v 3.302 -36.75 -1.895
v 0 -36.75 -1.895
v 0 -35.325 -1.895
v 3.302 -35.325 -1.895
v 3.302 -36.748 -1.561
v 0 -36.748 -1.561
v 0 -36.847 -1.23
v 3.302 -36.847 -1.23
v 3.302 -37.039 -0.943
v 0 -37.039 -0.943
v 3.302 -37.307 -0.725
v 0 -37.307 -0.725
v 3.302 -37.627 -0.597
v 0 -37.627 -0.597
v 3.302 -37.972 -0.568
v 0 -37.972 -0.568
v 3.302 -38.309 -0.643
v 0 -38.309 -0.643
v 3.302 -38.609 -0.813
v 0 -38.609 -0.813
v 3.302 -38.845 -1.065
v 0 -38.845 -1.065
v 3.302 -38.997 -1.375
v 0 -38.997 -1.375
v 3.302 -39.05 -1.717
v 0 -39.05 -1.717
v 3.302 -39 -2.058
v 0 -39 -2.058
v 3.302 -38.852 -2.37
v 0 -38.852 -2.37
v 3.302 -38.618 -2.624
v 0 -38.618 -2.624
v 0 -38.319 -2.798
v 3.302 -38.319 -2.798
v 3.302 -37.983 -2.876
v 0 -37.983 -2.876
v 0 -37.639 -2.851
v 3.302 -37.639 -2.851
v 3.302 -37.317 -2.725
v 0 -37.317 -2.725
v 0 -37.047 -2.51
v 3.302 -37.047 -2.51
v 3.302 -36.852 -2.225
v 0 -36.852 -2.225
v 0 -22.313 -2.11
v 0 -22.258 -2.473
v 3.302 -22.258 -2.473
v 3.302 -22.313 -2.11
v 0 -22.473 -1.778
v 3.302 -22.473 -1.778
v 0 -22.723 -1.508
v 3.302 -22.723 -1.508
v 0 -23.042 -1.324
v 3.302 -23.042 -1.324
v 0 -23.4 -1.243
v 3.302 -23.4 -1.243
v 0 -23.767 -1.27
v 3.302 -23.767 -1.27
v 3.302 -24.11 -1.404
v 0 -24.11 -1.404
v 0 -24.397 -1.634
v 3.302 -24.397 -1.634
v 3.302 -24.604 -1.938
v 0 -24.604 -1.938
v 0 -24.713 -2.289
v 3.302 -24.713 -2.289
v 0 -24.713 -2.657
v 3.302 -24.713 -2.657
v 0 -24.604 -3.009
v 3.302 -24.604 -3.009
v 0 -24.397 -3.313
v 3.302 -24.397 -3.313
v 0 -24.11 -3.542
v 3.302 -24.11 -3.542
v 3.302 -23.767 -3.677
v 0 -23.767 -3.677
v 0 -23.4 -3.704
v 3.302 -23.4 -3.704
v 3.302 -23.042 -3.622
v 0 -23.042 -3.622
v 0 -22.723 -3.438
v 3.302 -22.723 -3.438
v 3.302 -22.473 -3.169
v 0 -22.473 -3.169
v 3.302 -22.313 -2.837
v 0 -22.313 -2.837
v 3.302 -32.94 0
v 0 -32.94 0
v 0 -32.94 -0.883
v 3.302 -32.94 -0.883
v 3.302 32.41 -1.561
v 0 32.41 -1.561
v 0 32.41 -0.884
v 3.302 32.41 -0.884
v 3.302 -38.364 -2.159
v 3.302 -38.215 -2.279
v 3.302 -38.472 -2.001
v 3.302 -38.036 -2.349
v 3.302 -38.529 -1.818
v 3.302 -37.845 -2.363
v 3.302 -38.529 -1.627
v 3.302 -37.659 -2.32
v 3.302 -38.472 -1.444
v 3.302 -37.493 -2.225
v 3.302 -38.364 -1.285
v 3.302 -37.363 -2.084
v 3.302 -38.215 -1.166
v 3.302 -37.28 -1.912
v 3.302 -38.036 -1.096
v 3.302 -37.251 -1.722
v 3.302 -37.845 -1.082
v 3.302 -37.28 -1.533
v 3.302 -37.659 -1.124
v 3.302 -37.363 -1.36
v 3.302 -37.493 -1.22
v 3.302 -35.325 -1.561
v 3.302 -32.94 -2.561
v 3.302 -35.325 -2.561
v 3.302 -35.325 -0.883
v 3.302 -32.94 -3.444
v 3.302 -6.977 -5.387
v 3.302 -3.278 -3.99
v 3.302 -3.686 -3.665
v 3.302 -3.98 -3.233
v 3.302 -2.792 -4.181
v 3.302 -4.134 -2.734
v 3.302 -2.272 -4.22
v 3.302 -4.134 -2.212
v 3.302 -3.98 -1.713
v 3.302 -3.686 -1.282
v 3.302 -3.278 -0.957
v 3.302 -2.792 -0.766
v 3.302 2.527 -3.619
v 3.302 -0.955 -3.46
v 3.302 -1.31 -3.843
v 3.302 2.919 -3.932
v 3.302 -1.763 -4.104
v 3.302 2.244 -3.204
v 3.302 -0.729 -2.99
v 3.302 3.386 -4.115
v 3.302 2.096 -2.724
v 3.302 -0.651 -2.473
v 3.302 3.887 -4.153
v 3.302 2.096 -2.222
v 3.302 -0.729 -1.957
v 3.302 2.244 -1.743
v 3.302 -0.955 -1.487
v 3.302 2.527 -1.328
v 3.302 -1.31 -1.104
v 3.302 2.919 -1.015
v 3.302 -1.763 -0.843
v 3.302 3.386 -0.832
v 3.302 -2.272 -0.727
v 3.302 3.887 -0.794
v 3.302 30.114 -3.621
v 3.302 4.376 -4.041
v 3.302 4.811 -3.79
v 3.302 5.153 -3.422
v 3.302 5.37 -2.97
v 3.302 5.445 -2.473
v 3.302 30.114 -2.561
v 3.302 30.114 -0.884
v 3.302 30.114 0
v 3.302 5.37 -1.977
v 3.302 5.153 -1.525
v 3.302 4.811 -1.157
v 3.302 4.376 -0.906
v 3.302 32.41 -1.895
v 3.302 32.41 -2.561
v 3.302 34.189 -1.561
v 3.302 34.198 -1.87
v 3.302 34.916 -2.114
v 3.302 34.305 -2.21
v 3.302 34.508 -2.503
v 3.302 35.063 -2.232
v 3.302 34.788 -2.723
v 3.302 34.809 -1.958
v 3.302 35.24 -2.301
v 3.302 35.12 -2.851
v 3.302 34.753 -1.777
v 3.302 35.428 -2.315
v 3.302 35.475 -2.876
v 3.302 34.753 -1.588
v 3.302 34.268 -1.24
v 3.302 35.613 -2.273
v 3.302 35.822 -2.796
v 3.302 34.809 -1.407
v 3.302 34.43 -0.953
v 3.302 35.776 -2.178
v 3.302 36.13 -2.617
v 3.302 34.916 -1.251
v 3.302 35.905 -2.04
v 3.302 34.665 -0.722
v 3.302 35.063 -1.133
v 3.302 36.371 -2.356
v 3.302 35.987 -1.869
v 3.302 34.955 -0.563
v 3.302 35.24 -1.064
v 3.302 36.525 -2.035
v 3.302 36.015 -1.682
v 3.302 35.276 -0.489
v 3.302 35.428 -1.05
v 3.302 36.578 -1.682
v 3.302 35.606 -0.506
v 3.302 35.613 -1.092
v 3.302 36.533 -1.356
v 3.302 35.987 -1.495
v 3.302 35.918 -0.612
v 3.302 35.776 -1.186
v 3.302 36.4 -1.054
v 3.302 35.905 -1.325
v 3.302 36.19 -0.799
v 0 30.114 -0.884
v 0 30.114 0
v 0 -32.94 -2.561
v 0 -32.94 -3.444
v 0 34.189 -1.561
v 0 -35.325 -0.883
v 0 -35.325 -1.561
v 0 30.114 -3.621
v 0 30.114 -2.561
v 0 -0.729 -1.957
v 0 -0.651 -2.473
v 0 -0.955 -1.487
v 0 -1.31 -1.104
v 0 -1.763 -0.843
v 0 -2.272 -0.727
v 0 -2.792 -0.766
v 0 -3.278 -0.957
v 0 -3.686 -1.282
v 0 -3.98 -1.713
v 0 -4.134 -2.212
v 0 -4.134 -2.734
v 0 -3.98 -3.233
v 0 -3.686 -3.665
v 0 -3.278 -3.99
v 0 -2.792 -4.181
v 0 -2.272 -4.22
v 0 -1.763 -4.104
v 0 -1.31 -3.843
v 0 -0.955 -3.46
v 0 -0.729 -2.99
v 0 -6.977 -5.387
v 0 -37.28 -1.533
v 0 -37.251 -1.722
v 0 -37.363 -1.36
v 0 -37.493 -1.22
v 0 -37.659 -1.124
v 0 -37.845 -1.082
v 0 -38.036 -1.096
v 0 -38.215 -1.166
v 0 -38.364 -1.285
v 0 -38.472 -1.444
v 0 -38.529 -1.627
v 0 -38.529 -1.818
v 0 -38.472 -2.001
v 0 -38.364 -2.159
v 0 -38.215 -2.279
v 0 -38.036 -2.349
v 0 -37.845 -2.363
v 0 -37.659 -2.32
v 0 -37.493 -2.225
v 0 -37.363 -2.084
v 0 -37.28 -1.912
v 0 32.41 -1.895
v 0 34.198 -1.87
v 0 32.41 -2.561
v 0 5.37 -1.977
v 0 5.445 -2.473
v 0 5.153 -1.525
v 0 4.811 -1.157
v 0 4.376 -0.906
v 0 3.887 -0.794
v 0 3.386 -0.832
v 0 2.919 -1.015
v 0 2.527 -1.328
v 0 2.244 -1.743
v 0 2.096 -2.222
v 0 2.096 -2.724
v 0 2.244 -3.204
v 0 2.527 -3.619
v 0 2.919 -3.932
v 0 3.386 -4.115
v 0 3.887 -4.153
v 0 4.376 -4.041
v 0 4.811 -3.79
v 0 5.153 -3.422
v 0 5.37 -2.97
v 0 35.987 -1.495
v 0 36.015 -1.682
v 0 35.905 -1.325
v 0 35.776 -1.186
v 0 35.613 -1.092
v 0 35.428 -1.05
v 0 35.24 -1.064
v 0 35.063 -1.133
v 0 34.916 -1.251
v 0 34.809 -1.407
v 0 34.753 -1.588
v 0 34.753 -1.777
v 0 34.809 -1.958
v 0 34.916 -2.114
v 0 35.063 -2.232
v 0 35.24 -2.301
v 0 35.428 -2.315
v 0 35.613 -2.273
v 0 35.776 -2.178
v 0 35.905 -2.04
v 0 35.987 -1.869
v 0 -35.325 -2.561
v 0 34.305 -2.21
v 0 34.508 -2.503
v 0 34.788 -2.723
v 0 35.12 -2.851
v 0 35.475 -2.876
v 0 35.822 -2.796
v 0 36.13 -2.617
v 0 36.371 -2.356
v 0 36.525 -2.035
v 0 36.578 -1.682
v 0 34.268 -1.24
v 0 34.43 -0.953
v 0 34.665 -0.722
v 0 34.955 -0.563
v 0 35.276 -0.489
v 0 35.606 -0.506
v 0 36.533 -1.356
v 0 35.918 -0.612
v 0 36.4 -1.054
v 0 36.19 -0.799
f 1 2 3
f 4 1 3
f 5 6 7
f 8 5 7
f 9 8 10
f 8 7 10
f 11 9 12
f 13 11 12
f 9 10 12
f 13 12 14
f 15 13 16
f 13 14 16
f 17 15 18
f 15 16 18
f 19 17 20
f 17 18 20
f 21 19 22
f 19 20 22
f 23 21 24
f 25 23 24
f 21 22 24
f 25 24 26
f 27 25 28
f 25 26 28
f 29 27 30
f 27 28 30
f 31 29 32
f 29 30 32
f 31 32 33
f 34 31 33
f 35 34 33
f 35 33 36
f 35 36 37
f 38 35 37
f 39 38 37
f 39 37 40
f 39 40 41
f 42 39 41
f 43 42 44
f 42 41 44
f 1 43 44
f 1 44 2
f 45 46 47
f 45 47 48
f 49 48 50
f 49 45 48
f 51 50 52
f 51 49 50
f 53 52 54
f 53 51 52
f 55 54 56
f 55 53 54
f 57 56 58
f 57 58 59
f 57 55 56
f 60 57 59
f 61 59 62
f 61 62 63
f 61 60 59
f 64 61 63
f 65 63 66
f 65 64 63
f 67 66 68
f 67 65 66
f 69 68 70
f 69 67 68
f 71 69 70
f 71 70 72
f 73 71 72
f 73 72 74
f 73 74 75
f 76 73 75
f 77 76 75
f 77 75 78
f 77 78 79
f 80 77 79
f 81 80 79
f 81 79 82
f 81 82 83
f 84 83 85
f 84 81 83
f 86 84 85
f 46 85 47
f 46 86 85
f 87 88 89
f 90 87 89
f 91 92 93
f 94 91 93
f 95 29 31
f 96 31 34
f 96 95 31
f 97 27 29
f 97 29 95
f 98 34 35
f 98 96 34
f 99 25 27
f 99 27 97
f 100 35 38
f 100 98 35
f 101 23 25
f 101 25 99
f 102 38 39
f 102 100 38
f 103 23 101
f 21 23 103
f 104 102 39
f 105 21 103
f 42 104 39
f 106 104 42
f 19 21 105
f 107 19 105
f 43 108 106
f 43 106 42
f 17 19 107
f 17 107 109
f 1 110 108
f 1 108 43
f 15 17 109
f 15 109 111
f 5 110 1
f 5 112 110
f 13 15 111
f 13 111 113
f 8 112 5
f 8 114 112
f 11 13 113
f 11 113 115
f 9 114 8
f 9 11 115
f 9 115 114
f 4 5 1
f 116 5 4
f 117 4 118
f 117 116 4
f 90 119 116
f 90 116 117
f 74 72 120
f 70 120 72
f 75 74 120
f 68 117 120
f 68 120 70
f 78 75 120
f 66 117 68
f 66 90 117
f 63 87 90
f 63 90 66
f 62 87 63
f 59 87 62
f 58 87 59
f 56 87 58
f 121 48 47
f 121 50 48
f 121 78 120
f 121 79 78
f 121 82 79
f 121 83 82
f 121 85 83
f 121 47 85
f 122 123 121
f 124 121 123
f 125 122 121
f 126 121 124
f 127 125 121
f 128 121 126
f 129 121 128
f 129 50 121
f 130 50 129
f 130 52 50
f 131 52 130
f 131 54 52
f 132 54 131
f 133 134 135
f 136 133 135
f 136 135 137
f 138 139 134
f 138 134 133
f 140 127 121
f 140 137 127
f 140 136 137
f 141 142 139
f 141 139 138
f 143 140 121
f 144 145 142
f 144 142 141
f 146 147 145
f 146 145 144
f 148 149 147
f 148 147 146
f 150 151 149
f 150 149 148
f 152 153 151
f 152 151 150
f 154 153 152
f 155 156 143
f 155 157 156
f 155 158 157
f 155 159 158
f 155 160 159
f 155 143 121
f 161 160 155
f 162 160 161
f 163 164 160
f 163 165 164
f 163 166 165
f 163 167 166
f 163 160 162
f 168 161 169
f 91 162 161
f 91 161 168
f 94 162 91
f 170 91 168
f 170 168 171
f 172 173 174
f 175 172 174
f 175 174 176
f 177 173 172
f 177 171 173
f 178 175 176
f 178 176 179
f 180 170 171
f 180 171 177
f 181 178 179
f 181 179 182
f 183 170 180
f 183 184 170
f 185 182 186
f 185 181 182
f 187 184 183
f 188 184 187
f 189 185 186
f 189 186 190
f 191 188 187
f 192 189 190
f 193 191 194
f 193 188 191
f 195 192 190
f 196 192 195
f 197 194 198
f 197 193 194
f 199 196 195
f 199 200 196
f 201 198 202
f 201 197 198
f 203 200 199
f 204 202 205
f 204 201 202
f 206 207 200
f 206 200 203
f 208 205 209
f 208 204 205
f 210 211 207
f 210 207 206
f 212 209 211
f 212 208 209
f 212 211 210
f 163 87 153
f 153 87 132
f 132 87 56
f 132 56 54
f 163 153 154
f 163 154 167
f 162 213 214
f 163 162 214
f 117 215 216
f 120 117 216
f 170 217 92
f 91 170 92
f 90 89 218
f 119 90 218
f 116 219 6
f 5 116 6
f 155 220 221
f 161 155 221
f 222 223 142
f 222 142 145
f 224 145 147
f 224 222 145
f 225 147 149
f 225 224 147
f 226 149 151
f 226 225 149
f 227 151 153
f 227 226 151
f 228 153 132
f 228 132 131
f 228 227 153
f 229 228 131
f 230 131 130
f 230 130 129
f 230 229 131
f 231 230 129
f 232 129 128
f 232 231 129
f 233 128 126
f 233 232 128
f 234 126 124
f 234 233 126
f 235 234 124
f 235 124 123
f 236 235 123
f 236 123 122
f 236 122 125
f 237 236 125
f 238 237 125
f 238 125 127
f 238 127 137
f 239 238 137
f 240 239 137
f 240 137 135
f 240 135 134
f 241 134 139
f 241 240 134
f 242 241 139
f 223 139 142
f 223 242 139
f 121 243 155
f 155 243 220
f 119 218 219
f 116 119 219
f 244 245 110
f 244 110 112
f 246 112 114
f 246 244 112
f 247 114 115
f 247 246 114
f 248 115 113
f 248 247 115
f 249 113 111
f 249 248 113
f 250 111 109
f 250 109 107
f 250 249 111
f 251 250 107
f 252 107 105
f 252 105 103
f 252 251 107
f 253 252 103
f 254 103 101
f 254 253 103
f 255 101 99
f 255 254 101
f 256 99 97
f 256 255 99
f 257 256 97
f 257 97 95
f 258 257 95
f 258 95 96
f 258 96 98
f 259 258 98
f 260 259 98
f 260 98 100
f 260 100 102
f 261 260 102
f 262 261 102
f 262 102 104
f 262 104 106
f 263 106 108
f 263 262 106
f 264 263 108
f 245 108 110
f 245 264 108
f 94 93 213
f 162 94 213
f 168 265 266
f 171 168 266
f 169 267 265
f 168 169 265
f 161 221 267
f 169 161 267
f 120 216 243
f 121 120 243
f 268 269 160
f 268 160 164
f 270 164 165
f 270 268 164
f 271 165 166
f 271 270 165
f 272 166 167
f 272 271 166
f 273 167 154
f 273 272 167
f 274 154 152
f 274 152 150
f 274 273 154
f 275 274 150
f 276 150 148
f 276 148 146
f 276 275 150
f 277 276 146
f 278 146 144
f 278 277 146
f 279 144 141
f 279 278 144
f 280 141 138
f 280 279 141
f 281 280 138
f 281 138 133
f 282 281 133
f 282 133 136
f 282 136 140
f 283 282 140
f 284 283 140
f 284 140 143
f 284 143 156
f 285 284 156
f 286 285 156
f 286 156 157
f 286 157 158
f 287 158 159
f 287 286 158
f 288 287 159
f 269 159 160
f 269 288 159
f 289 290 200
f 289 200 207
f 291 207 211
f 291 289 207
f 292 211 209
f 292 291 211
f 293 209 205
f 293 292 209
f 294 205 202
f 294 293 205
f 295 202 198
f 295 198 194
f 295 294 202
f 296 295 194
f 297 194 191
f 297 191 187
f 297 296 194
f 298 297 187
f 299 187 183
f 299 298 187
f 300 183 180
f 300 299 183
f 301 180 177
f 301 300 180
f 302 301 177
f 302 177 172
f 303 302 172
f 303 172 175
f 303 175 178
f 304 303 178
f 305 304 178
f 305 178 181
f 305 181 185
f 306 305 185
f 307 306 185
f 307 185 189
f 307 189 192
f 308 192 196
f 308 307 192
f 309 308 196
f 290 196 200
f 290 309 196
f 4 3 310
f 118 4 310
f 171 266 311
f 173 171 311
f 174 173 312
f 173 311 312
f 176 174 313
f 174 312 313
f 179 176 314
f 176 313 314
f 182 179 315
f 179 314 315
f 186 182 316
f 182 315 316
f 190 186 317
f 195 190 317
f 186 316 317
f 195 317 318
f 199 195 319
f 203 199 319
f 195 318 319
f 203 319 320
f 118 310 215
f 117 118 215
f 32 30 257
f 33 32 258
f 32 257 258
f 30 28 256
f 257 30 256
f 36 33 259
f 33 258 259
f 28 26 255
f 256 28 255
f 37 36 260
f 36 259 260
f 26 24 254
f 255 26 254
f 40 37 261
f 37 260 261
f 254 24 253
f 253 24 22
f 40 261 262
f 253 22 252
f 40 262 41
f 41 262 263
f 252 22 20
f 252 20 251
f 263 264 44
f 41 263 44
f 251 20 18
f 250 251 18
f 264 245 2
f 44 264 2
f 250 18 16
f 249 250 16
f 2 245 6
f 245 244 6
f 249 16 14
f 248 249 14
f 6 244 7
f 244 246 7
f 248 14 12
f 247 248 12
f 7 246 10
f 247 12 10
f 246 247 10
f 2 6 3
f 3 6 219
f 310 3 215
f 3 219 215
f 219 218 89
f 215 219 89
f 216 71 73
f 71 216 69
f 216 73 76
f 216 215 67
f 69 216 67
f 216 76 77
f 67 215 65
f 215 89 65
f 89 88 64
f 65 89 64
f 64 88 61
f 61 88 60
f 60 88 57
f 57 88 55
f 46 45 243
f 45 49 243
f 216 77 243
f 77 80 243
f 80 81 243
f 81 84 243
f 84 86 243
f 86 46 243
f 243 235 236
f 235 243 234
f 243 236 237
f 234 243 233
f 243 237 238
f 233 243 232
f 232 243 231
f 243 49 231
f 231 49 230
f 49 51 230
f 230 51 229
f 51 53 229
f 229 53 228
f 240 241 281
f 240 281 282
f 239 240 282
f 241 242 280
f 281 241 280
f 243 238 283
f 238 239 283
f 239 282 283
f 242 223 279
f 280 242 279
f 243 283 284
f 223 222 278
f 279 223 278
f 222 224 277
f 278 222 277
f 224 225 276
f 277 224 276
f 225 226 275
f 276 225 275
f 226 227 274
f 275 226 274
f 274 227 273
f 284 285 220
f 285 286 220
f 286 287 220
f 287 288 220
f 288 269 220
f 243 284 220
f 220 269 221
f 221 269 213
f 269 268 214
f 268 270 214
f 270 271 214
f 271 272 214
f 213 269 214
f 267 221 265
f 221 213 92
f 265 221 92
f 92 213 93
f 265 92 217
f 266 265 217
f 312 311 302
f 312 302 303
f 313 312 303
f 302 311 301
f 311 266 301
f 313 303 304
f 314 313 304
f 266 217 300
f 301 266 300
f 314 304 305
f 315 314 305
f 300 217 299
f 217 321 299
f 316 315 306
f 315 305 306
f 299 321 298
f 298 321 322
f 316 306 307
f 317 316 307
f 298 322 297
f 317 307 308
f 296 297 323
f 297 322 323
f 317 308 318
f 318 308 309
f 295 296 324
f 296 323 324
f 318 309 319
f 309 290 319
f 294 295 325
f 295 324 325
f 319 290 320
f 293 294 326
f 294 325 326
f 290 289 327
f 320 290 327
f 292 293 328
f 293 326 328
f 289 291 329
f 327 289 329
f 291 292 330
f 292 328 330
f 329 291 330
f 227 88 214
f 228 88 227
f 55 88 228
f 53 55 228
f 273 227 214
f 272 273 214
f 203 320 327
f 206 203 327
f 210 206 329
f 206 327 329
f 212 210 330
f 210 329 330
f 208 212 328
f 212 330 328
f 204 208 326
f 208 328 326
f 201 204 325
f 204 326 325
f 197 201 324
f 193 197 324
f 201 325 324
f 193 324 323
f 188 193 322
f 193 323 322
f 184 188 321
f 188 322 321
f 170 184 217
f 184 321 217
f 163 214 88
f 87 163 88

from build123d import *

# Parameters (mm, degrees)
F0_R     = 1.2342692754
F0_R_2   = 1.7514332525
F0_R_3   = 1.6840139575
F0_R_4   = 0.6424379712
F0_R_5   = 0.6344814838
F1_DEPTH = 3.302


with BuildPart() as f1:
    # F0 (on Right) → F1 (new body)
    with BuildSketch(Plane.YZ):
        Polygon((30.1141384989, 0), (0, 0), (-32.9401008785, 0), (-32.9401008785, -0.8831103914), (-32.9401008785, -2.5610264856), (-32.9401008785, -3.4441391472), (-6.9765895605, -5.3869867697), (30.1141384989, -3.6207614467), (30.1141384989, -2.5610264856), (30.1141384989, -0.883640887), align=None)
        with Locations((-23.4924610704, -2.4733557366)):
            Circle(F0_R, mode=Mode.SUBTRACT)
        with Locations((-2.4024450686, -2.4733557366)):
            Circle(F0_R_2, mode=Mode.SUBTRACT)
        with Locations((3.7611864973, -2.4733557366)):
            Circle(F0_R_3, mode=Mode.SUBTRACT)
        Polygon((-32.9401008785, -2.5610264856), (-32.9401008785, -0.8831103914), (-35.3245027363, -0.8831103914), (-35.3245027363, -1.5608620106), (-35.3245027363, -1.7220684385), (-35.3245027363, -1.8952260725), (-35.3245027363, -2.5610264856), align=None)
        Polygon((32.4102304876, -0.883640887), (30.1141384989, -0.883640887), (30.1141384989, -2.5610264856), (32.4102304876, -2.5610264856), (32.4102304876, -1.8952260725), (32.4102304876, -1.7223336863), (32.4102304876, -1.5608620106), align=None)
        with BuildLine():
            Line((-35.3245027363, -1.7220684385), (-35.3245027363, -1.5608620106))
            Line((-35.3245027363, -1.5608620106), (-36.7480435846, -1.5608620106))
            ThreePointArc((-36.7480435846, -1.5608620106), (-36.7395622808, -1.6412672061), (-36.736718196, -1.7220684385))
            Line((-36.736718196, -1.7220684385), (-35.3245027363, -1.7220684385))
        make_face()
        with BuildLine():
            Line((34.18918825, -1.5608620106), (32.4102304876, -1.5608620106))
            Line((32.4102304876, -1.5608620106), (32.4102304876, -1.7223336863))
            Line((32.4102304876, -1.7223336863), (32.4102304876, -1.8952260725))
            Line((32.4102304876, -1.8952260725), (34.1978147229, -1.8702070236))
            ThreePointArc((34.1978147229, -1.8702070236), (34.1834682887, -1.7158143054), (34.18918825, -1.5608620106))
        make_face()
        with BuildLine():
            Line((-36.7497117243, -1.8952260725), (-35.3245027363, -1.8952260725))
            Line((-35.3245027363, -1.8952260725), (-35.3245027363, -1.7220684385))
            Line((-35.3245027363, -1.7220684385), (-36.736718196, -1.7220684385))
            ThreePointArc((-36.736718196, -1.7220684385), (-36.7367181732, -1.7222010624), (-36.7367181656, -1.7223336863))
            ThreePointArc((-36.7367181656, -1.7223336863), (-36.7399711292, -1.8090236652), (-36.7497117243, -1.8952260725))
        make_face()
        with BuildLine():
            ThreePointArc((-36.736718196, -1.7220684385), (-36.7395622808, -1.6412672061), (-36.7480435846, -1.5608620106))
            ThreePointArc((-36.7480435846, -1.5608620106), (-39.050204678, -1.7165627393), (-36.7497117243, -1.8952260725))
            ThreePointArc((-36.7497117243, -1.8952260725), (-36.7399711292, -1.8090236652), (-36.7367181656, -1.7223336863))
            ThreePointArc((-36.7367181656, -1.7223336863), (-36.7367181732, -1.7222010624), (-36.736718196, -1.7220684385))
        make_face()
        with Locations((-37.8934686196, -1.7223336863)):
            Circle(F0_R_4, mode=Mode.SUBTRACT)
        with BuildLine():
            Line((34.1978147229, -1.5608620106), (34.18918825, -1.5608620106))
            ThreePointArc((34.18918825, -1.5608620106), (34.1834682887, -1.7158143054), (34.1978147229, -1.8702070236))
            Line((34.1978147229, -1.8702070236), (34.1978147229, -1.5608620106))
        make_face()
        with BuildLine():
            ThreePointArc((36.5784095148, -1.6824278282), (35.4415677285, -0.4862718496), (34.18918825, -1.5608620106))
            Line((34.18918825, -1.5608620106), (34.1978147229, -1.5608620106))
            Line((34.1978147229, -1.5608620106), (34.1978147229, -1.8702070236))
            ThreePointArc((34.1978147229, -1.8702070236), (35.4748874223, -2.876422446), (36.5784095148, -1.6824278282))
        make_face()
        with Locations((35.3807061911, -1.6824278282)):
            Circle(F0_R_5, mode=Mode.SUBTRACT)
    extrude(amount=F1_DEPTH)


solid = f1.part
